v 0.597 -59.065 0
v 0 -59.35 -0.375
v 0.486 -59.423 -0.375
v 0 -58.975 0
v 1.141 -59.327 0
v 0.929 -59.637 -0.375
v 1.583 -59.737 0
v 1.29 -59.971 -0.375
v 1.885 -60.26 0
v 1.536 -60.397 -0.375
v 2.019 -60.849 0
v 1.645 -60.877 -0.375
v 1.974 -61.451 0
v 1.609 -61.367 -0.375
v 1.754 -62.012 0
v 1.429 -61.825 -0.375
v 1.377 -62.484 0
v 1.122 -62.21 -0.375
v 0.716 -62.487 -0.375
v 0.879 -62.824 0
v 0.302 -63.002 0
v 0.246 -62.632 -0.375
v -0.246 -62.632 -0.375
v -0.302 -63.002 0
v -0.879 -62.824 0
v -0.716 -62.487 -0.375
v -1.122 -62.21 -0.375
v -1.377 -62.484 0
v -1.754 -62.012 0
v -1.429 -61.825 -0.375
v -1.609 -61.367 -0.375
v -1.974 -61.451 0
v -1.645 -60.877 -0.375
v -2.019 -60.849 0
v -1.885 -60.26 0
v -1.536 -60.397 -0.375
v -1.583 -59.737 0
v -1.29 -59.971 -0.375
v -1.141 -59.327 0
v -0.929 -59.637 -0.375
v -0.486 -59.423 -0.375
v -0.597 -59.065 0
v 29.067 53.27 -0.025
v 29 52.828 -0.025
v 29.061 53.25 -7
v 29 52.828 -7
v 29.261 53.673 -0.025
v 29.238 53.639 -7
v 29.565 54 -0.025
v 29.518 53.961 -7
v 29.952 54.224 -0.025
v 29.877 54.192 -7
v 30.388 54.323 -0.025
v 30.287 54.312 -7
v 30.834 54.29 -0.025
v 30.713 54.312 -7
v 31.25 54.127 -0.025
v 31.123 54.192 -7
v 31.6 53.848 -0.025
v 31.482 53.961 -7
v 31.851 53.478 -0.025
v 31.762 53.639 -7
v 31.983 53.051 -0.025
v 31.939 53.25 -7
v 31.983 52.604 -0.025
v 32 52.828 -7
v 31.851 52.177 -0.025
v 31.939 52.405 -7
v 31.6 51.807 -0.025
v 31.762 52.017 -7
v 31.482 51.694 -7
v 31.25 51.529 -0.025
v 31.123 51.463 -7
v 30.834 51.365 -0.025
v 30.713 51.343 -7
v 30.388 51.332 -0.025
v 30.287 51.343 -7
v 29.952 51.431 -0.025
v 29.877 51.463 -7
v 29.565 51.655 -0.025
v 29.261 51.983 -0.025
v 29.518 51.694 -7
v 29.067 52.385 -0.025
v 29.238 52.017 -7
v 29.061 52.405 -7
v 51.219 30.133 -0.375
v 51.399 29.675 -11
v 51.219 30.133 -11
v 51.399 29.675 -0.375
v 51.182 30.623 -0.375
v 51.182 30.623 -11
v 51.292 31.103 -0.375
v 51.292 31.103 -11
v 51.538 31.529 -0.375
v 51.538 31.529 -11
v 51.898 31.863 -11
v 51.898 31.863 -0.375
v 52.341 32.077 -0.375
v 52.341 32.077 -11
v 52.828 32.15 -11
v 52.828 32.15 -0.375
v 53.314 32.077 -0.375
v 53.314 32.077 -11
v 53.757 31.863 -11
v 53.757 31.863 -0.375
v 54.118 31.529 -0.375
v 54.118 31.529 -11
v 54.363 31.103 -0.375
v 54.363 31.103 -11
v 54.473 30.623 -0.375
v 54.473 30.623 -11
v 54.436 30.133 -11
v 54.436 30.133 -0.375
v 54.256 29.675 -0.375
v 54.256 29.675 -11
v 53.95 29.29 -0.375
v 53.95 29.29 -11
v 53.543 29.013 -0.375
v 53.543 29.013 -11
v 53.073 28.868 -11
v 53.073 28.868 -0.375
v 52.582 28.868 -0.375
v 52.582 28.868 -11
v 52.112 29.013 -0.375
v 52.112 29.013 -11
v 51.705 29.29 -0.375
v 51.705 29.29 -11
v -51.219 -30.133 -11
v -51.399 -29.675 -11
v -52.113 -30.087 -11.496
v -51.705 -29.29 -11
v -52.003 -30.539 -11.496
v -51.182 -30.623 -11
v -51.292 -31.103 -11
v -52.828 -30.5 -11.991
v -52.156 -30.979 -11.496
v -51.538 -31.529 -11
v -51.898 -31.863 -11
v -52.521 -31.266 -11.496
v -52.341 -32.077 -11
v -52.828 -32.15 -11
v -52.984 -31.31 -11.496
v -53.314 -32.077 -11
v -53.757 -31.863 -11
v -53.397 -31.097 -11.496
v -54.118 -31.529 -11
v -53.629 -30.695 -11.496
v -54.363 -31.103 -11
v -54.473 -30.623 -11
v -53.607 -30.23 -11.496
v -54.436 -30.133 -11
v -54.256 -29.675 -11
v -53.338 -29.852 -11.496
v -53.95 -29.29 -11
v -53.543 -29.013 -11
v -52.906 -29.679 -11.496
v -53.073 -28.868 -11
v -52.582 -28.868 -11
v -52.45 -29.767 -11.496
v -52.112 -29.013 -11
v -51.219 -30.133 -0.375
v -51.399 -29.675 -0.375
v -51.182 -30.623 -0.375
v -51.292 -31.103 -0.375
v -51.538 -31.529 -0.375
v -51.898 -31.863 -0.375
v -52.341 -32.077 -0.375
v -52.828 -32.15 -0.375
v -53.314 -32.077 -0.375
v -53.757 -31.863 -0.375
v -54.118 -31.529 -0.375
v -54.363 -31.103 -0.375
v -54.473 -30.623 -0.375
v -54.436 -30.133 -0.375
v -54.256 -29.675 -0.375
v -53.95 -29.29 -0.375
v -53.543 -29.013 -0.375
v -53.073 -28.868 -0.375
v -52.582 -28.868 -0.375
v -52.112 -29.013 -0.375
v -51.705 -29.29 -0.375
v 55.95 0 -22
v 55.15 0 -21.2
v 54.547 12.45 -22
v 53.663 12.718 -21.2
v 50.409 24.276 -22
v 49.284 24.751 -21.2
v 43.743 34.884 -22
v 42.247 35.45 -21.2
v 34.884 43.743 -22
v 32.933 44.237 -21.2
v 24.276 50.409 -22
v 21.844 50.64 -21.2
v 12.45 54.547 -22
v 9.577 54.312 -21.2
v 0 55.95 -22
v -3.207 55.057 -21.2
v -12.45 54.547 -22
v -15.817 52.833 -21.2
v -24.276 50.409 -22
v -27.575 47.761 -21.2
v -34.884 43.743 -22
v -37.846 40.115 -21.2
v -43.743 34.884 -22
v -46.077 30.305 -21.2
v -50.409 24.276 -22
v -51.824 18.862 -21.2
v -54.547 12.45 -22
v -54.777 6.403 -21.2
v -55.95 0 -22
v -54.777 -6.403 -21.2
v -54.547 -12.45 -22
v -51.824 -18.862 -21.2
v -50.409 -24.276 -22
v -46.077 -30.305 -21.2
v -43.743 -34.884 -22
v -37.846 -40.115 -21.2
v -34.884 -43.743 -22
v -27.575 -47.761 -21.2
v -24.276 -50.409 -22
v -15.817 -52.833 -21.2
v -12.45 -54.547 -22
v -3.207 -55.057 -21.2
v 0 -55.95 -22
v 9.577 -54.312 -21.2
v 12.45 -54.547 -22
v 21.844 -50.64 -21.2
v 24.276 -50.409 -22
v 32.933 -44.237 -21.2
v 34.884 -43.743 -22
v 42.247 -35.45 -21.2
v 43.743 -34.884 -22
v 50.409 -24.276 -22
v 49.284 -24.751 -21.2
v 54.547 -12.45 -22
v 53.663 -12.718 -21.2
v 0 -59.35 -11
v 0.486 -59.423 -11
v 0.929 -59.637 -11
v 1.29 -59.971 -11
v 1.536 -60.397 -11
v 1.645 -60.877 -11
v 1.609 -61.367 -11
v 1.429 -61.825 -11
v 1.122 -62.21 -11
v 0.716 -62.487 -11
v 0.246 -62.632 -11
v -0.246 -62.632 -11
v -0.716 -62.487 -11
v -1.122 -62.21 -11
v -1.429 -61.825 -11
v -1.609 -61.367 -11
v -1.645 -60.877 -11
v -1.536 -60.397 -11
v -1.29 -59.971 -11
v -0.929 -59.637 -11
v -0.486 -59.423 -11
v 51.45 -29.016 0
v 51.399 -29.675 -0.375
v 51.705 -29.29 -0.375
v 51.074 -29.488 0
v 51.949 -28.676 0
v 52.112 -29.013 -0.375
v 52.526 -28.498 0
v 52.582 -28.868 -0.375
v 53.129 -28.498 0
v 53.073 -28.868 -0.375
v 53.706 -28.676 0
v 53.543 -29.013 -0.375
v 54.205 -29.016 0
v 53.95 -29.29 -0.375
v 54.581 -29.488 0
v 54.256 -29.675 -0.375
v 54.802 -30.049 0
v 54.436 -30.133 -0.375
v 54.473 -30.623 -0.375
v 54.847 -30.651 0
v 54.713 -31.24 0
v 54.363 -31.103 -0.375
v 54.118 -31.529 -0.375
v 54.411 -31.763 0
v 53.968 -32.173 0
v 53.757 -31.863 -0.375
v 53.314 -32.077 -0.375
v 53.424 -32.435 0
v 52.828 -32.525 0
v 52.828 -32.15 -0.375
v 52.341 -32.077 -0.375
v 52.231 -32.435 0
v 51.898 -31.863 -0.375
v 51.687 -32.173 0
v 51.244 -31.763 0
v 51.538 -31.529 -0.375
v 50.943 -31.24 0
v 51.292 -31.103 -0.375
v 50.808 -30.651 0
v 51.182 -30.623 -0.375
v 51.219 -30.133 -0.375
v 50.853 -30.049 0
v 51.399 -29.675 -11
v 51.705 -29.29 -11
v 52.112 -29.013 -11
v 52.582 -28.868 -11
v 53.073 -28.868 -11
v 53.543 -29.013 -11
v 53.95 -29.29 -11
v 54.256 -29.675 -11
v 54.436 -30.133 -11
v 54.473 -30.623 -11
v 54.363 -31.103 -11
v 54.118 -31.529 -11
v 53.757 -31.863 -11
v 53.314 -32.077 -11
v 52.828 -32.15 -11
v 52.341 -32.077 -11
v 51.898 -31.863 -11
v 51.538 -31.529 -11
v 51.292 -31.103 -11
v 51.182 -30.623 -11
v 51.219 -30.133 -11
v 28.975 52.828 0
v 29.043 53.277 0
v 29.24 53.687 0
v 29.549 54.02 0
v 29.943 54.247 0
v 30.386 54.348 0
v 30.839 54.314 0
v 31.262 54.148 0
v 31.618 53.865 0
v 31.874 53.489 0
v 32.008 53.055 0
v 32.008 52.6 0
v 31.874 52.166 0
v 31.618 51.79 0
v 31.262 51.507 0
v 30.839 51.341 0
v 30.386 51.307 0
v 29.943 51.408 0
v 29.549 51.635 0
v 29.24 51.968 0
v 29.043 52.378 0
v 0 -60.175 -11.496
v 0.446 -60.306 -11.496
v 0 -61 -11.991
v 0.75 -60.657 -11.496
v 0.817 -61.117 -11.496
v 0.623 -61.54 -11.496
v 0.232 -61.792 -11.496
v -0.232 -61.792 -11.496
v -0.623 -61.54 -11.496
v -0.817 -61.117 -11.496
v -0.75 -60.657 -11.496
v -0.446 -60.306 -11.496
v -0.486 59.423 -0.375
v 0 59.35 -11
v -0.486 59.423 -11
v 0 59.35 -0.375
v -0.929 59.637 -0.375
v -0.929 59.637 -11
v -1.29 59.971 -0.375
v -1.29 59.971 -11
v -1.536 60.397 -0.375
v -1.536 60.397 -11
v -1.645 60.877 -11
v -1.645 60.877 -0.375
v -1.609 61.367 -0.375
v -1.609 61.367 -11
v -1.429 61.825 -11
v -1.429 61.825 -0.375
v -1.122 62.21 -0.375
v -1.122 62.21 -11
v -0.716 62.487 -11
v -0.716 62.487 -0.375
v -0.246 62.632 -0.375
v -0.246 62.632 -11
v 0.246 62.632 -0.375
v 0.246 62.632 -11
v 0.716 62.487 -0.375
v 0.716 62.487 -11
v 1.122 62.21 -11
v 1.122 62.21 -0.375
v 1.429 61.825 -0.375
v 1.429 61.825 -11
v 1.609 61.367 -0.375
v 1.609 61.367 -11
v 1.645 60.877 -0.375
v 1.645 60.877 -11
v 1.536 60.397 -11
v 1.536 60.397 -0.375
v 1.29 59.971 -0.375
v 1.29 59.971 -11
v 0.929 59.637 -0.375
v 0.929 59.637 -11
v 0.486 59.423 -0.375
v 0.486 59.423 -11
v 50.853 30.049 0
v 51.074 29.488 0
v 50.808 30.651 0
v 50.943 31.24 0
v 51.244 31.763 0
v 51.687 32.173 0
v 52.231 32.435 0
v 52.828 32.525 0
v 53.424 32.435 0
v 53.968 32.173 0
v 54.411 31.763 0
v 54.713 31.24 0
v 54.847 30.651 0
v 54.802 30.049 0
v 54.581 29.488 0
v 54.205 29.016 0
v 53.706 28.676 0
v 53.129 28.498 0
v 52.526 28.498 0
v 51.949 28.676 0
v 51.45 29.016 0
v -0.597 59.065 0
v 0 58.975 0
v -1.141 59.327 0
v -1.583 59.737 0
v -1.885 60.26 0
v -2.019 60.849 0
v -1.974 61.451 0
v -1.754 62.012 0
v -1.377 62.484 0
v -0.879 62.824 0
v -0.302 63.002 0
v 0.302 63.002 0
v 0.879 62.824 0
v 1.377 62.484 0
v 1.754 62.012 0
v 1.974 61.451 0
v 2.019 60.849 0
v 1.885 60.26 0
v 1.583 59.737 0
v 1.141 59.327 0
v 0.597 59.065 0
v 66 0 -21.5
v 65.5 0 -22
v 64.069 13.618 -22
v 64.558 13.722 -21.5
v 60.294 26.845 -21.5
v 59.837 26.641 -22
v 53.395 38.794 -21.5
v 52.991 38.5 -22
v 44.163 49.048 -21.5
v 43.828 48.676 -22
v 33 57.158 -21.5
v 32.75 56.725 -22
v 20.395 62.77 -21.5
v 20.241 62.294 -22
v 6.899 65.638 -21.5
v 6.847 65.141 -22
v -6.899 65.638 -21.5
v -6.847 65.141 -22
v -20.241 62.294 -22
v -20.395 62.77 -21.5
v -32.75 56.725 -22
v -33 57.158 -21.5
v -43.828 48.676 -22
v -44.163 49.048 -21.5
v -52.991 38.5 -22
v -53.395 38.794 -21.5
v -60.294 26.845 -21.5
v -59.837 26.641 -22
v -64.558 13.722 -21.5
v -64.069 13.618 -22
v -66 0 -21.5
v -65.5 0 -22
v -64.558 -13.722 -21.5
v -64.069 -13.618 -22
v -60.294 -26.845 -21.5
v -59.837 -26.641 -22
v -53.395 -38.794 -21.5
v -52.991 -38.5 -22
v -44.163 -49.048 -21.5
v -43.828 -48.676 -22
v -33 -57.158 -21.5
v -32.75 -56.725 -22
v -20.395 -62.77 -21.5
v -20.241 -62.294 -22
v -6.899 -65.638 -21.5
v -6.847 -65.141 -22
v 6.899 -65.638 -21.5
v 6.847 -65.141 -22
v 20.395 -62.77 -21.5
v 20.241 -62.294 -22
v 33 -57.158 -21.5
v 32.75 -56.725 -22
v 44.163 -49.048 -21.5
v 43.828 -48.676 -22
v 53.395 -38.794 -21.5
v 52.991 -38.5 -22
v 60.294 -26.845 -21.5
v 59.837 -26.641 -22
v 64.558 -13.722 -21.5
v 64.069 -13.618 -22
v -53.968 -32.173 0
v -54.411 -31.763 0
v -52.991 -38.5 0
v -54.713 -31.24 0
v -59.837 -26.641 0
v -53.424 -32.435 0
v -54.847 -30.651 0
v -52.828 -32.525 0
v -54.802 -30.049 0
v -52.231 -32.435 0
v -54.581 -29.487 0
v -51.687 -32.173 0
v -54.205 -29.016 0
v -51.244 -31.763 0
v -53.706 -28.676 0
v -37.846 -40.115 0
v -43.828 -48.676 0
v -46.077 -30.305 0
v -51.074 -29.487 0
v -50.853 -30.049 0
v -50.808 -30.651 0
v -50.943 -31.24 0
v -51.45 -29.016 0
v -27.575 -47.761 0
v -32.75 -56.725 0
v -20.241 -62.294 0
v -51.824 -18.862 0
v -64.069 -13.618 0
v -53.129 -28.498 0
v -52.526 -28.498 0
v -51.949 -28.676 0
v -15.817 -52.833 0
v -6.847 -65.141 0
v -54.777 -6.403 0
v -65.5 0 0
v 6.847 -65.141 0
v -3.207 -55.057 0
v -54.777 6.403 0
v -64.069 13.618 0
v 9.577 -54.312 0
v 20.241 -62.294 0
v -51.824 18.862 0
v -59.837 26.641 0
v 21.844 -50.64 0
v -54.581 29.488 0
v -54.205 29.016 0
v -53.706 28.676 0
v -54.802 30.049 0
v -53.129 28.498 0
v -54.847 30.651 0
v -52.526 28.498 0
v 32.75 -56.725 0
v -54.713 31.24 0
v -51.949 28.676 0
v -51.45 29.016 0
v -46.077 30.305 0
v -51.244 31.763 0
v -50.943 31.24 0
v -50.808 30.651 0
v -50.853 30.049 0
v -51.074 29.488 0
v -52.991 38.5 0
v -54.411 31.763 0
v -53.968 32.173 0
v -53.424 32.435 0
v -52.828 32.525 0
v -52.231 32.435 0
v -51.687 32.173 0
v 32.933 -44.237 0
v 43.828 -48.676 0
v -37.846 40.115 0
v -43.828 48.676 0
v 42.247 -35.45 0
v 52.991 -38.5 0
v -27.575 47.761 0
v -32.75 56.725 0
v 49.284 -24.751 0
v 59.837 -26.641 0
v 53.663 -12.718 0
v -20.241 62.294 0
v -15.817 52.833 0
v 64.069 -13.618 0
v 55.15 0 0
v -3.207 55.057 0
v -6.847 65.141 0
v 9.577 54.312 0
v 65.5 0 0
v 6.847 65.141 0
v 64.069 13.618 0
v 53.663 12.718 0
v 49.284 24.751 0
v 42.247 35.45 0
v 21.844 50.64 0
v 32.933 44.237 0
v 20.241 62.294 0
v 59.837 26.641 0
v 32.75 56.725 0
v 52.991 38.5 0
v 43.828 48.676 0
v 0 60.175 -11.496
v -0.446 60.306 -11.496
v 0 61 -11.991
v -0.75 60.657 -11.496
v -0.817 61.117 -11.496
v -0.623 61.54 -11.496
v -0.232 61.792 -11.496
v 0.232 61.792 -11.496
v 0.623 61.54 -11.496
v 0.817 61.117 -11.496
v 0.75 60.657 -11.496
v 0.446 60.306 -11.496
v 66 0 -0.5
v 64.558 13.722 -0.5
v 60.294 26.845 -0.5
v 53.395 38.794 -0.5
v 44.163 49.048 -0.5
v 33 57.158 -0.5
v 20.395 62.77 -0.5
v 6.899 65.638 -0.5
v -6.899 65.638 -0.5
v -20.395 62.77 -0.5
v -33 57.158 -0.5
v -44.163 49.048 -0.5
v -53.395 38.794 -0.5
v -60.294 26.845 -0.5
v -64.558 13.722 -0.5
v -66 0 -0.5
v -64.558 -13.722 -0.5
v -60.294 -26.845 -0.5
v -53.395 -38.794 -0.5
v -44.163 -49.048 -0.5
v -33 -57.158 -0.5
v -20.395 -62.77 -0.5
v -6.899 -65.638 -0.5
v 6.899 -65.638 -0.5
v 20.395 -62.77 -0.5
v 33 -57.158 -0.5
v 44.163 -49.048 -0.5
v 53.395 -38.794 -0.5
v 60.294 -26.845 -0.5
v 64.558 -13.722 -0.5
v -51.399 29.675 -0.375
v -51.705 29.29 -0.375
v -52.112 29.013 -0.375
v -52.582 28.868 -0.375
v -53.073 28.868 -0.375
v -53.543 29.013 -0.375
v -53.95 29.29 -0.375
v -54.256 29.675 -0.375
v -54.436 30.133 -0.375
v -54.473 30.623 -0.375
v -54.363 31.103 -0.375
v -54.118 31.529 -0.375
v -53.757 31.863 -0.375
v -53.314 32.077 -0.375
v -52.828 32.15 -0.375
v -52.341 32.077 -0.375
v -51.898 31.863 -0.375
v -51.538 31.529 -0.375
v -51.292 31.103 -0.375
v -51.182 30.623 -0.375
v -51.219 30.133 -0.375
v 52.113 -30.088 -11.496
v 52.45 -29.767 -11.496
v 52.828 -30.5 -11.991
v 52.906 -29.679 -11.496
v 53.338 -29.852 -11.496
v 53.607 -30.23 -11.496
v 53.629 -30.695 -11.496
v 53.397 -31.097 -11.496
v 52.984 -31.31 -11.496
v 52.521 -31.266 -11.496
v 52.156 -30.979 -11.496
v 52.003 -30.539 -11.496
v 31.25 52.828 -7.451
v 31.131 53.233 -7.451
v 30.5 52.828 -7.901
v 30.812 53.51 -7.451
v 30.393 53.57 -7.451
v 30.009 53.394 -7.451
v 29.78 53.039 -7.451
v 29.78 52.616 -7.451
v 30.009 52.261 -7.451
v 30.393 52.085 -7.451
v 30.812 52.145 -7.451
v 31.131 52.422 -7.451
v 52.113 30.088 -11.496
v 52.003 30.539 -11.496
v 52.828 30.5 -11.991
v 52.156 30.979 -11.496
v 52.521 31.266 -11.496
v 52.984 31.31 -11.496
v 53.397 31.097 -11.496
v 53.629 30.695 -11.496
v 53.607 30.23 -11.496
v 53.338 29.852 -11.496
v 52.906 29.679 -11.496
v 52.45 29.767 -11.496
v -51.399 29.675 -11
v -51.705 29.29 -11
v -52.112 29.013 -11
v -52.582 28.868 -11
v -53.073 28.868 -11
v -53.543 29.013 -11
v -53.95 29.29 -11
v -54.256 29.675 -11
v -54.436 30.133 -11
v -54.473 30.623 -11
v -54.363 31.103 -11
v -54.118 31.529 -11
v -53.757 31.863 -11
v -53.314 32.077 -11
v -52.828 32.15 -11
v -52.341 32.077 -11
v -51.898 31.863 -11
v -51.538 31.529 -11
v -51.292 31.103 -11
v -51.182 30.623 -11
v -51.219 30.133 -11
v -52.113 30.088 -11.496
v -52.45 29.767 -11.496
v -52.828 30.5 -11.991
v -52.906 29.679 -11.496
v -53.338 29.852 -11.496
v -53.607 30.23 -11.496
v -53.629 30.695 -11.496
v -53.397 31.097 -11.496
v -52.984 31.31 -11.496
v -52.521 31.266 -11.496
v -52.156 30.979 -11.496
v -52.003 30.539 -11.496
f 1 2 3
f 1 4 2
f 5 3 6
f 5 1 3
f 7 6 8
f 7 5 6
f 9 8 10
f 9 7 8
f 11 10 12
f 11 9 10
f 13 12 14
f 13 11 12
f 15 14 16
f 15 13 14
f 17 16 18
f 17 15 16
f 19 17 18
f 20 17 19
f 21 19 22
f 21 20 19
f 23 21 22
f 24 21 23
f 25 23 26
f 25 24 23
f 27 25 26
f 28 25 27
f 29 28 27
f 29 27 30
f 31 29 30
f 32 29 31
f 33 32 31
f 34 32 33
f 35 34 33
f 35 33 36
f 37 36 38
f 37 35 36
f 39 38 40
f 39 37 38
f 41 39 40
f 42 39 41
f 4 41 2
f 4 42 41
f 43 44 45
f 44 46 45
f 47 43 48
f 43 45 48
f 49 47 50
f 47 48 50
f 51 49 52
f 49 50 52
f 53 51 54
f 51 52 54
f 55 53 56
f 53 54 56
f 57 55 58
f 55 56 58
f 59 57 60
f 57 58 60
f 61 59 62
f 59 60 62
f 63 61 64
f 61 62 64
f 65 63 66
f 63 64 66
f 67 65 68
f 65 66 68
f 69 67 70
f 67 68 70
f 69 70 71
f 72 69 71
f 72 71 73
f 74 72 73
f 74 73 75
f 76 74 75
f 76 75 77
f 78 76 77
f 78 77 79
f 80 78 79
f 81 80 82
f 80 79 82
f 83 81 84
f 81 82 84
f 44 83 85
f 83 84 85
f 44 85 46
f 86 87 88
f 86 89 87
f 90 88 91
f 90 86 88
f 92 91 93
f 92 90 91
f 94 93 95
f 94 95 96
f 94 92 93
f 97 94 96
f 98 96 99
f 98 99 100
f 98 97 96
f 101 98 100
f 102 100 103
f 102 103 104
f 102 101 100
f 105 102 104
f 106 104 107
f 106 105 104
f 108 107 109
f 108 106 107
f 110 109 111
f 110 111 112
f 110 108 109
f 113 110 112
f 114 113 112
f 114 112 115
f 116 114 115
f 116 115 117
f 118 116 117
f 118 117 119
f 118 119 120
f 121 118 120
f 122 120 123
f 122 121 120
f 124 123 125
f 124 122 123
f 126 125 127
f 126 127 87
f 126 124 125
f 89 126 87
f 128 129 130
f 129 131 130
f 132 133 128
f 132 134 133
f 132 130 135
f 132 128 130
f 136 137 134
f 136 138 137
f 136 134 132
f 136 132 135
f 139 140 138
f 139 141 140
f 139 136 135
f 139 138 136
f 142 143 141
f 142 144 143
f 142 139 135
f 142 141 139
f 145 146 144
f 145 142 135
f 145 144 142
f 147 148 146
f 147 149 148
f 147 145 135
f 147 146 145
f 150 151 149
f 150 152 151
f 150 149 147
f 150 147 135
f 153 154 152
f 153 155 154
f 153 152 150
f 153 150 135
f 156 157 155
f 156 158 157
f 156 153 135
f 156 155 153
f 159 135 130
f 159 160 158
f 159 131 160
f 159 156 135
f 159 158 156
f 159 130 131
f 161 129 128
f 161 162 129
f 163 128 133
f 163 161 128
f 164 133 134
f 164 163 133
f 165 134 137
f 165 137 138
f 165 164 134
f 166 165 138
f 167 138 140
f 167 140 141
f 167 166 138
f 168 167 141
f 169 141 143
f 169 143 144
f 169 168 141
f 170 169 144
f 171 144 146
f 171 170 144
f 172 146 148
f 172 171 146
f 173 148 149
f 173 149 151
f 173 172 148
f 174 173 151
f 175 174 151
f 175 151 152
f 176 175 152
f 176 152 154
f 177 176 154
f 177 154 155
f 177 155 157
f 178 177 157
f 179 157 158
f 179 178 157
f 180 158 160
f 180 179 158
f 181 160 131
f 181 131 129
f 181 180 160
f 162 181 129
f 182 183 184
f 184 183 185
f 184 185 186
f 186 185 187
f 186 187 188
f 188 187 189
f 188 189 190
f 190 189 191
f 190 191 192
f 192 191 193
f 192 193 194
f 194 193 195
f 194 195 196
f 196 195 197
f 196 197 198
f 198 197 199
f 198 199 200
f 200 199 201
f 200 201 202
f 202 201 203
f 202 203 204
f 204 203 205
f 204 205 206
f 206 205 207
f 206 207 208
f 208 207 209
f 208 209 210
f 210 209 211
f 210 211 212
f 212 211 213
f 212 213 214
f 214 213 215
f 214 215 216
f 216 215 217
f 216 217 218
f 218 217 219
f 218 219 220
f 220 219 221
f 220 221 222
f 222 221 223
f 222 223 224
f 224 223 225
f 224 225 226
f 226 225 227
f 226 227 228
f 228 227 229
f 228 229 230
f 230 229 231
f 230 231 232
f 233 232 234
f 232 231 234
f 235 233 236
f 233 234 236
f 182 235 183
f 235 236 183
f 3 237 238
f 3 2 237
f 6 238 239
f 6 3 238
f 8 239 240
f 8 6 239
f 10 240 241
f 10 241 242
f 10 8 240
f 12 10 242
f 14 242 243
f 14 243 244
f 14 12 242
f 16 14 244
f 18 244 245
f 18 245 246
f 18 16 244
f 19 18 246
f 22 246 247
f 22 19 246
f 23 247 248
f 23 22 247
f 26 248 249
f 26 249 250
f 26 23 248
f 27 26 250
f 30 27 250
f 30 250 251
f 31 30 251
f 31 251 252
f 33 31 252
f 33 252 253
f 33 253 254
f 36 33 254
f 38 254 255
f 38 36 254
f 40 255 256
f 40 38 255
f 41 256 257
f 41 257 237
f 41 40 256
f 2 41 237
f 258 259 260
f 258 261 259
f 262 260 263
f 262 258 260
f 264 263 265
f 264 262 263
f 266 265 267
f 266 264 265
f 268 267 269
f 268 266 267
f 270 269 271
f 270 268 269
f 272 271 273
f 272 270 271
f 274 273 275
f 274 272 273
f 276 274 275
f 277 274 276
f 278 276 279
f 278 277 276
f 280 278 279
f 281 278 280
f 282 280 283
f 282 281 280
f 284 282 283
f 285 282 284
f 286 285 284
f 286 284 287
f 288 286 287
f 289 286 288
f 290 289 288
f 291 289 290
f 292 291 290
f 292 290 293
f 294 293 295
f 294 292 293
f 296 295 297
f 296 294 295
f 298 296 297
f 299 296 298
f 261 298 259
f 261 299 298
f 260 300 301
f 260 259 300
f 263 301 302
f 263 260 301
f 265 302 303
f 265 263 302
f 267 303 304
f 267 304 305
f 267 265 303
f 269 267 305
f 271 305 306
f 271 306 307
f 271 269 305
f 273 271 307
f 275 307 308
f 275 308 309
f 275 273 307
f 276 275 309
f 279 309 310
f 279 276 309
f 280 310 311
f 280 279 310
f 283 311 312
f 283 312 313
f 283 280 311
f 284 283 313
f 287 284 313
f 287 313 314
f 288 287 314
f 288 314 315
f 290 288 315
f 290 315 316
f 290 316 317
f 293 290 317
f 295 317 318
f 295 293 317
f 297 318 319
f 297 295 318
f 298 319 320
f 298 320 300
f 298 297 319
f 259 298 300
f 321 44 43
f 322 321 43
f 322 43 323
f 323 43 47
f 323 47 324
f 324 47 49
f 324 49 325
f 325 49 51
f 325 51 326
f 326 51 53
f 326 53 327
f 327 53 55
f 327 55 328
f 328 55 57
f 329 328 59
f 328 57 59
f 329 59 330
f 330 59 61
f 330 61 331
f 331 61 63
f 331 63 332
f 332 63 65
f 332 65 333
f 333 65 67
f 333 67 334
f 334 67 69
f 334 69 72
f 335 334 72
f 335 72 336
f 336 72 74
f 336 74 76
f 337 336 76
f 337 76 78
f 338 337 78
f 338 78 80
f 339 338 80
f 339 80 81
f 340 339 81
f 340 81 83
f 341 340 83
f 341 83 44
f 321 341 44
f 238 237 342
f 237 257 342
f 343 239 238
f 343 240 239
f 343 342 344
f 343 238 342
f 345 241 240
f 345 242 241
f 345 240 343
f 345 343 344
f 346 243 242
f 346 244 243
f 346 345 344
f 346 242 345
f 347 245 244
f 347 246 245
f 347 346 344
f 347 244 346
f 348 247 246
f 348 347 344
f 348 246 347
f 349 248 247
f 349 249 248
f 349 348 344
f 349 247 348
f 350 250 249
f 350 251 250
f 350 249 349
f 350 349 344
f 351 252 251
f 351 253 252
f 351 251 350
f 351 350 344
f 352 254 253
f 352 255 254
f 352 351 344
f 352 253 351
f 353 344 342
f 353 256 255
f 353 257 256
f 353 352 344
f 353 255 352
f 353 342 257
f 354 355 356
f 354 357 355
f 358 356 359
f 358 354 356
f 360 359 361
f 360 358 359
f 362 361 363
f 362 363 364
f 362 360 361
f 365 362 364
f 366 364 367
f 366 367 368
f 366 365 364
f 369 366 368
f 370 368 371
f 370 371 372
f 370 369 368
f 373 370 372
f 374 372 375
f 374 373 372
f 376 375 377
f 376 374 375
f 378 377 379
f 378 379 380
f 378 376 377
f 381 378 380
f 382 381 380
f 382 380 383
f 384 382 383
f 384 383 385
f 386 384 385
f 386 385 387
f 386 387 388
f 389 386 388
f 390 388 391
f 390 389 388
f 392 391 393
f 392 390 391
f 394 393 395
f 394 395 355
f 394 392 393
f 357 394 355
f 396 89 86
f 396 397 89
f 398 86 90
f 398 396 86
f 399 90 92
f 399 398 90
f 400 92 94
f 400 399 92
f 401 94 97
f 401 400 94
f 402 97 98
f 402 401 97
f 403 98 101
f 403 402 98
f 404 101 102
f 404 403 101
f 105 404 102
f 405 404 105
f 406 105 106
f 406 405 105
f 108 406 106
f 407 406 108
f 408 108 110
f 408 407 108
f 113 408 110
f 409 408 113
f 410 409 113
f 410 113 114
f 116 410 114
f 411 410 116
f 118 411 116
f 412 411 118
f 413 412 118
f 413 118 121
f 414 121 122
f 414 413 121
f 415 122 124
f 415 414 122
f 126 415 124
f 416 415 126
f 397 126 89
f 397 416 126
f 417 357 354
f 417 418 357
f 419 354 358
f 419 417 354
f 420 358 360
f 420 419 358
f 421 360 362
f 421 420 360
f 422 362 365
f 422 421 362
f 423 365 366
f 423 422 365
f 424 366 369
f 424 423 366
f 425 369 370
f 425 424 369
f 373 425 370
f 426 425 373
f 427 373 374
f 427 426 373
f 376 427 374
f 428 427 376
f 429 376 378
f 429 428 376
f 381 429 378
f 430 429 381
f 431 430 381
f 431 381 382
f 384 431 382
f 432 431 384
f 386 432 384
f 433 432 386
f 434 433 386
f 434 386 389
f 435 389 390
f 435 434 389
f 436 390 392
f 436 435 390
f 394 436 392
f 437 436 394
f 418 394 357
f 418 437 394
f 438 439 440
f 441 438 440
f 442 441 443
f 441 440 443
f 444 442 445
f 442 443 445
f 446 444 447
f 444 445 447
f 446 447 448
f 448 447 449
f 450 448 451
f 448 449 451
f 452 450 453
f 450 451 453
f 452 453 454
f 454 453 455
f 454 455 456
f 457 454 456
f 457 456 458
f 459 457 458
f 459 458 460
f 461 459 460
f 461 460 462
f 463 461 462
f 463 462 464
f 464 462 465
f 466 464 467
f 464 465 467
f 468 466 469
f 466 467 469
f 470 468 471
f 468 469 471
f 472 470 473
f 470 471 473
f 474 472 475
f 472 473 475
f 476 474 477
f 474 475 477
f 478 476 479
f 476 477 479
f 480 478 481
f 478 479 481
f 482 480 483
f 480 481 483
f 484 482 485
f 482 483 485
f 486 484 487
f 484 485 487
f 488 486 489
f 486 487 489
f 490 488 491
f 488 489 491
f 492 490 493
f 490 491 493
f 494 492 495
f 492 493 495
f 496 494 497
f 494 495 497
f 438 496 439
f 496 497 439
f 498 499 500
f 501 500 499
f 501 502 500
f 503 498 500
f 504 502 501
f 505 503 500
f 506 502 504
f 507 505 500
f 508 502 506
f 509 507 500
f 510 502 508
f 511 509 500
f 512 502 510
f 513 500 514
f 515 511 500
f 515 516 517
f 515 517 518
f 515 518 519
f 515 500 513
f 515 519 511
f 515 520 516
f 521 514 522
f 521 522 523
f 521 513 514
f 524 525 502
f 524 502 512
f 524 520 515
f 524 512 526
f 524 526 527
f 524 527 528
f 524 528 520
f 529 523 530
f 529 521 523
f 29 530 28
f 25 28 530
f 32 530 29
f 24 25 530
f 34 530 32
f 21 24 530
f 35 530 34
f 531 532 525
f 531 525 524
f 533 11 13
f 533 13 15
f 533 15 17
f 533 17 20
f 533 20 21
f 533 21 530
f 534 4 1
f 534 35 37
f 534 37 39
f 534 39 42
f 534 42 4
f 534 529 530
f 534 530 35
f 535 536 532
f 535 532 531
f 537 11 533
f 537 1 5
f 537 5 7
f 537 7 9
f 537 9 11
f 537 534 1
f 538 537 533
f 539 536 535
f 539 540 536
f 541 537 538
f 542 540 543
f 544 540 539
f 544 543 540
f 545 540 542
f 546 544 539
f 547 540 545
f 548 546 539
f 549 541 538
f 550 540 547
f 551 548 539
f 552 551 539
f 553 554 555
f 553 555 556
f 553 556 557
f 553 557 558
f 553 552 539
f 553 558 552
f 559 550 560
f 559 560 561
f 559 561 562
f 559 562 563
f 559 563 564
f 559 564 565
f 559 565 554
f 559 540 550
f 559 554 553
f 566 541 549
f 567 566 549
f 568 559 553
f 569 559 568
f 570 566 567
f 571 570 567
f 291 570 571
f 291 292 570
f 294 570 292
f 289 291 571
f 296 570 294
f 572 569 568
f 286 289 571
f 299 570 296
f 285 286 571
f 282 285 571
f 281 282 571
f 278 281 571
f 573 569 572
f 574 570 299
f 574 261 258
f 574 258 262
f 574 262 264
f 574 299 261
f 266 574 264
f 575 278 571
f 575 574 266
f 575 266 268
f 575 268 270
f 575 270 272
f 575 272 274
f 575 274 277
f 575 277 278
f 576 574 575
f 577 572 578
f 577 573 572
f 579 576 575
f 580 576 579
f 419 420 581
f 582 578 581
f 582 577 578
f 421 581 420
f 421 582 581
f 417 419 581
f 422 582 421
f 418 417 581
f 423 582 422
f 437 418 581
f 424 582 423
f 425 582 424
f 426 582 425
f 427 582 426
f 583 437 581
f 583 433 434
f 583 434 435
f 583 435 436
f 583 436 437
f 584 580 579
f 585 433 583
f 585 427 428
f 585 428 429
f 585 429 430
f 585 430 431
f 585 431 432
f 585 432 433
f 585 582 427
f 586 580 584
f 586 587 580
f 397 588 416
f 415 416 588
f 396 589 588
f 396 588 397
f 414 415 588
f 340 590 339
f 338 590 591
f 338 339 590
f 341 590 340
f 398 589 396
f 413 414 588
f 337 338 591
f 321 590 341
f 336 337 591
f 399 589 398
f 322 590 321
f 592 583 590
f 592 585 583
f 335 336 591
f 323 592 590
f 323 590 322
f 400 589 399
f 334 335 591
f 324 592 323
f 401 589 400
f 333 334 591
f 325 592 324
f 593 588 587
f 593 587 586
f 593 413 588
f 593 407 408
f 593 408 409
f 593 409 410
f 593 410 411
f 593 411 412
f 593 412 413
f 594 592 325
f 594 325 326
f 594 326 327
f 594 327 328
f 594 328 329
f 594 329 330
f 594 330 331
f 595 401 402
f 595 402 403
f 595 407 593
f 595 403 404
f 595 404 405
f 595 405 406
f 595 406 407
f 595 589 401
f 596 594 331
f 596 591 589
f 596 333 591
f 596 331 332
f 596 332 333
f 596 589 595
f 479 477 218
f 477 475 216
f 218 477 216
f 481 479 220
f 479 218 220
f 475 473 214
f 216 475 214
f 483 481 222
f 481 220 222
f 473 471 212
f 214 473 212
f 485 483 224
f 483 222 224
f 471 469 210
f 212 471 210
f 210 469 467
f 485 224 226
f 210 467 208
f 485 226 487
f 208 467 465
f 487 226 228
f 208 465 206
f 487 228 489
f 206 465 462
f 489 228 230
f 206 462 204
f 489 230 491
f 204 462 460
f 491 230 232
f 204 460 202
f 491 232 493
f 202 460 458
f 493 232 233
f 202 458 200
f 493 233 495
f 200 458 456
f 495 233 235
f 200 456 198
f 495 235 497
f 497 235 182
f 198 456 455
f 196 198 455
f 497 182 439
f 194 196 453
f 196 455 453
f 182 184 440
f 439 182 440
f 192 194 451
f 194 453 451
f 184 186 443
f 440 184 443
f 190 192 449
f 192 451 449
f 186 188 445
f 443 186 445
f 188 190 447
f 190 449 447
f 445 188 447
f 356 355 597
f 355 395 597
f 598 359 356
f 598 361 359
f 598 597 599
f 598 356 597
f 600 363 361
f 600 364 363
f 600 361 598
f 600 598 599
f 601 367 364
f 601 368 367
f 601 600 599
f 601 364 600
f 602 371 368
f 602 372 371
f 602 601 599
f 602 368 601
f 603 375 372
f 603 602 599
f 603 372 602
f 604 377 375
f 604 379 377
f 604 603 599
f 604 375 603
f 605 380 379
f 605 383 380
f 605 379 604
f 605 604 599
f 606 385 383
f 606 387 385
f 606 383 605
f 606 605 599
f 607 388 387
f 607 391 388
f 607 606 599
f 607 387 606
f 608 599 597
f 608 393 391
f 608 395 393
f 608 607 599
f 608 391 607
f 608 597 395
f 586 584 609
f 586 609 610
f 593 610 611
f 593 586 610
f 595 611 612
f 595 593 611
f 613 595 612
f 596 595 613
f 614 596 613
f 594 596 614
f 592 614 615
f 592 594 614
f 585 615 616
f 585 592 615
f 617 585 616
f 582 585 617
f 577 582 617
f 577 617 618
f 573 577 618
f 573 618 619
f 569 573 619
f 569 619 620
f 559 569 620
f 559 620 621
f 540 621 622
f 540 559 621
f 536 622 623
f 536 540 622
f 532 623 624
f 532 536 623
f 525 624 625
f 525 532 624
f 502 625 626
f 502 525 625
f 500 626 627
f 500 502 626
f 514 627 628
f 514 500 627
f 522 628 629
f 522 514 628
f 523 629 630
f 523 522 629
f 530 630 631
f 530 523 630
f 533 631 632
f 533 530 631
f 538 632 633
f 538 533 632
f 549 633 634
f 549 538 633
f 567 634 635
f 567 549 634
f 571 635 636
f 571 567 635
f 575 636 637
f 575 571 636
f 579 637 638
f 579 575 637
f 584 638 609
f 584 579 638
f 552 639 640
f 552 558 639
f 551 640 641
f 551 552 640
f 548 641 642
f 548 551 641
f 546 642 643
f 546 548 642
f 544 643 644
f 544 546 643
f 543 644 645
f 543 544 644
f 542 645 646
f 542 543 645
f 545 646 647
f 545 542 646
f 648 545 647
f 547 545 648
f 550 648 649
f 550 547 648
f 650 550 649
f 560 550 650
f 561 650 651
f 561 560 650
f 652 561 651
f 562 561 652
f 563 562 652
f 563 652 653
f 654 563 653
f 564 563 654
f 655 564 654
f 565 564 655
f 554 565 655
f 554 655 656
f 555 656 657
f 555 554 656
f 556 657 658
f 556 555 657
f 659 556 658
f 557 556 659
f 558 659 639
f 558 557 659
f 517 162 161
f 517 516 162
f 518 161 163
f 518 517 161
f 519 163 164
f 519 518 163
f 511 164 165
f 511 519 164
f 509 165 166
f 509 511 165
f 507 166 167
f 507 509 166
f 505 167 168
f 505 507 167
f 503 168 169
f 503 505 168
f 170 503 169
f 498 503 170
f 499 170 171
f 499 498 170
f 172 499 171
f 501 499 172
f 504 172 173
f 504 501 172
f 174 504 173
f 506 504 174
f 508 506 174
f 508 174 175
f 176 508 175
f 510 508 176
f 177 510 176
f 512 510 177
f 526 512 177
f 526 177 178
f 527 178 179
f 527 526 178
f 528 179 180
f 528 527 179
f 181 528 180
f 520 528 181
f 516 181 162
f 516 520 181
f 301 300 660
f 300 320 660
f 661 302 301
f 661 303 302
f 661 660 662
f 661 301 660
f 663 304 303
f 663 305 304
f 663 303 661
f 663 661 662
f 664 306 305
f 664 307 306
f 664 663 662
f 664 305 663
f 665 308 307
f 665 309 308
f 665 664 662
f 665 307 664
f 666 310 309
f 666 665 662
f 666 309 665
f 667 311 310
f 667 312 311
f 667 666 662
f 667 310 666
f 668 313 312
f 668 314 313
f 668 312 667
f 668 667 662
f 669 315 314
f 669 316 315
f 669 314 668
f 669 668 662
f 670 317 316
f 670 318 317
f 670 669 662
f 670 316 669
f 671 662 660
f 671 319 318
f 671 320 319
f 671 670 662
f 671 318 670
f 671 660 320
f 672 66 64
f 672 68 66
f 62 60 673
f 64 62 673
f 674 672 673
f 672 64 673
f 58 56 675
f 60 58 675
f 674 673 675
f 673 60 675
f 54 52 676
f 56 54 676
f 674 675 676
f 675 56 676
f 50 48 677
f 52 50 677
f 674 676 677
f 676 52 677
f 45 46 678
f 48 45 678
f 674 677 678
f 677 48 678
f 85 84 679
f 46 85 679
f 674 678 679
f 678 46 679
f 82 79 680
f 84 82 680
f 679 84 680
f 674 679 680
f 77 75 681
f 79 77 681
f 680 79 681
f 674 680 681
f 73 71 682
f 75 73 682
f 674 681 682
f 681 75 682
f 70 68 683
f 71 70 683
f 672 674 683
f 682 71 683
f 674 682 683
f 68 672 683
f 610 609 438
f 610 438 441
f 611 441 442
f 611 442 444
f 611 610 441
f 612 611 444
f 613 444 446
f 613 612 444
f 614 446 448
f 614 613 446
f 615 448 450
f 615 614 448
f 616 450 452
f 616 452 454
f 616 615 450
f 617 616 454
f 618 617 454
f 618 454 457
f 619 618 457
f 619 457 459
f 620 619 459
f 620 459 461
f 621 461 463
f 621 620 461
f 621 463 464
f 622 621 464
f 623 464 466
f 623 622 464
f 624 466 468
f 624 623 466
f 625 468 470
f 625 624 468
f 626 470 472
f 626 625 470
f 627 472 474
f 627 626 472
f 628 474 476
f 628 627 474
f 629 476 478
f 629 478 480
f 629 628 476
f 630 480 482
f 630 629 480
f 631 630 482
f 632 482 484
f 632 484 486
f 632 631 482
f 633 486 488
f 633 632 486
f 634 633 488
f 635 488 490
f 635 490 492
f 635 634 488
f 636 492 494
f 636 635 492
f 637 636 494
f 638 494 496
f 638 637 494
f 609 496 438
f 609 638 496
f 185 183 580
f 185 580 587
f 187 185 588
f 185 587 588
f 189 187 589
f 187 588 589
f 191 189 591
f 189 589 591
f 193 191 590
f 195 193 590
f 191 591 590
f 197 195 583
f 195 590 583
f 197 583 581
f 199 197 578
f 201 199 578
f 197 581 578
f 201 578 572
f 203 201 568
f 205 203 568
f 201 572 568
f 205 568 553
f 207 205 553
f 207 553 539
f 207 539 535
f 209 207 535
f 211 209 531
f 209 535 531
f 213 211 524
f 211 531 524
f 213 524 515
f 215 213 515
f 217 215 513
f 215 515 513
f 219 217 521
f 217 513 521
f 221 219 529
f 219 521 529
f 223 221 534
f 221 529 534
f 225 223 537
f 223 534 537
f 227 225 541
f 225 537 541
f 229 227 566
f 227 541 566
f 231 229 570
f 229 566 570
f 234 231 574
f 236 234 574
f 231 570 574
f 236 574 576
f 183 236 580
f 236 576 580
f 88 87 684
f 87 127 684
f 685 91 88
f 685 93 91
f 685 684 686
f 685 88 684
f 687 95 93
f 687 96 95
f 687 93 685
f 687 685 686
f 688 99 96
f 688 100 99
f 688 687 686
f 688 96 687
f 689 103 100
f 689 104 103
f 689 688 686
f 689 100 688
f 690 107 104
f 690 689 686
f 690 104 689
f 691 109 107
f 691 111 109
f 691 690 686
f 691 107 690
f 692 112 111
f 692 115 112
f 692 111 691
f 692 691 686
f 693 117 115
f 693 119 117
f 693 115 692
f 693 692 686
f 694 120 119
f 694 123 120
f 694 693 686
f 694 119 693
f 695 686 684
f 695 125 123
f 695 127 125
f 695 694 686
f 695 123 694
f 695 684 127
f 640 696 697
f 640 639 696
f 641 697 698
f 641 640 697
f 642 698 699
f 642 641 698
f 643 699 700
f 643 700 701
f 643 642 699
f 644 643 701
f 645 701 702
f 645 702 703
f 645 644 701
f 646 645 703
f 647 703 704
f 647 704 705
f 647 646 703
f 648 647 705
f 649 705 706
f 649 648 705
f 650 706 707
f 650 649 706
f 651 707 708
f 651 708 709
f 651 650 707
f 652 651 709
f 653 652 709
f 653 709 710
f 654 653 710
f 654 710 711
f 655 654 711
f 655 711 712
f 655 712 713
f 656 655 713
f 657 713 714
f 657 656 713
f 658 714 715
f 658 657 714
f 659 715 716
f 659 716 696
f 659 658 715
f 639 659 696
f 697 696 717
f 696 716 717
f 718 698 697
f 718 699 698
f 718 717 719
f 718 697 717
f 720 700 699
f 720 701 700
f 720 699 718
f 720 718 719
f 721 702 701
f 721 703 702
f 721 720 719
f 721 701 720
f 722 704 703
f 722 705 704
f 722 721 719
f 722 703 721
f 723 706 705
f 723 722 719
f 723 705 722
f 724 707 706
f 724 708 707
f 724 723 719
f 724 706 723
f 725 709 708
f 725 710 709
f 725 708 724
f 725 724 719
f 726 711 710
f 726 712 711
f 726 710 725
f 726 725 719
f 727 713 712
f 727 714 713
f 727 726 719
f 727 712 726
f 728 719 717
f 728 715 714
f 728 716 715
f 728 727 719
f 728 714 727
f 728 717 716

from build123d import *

# Parameters (mm, degrees)
SKETCH1_R                       = 66
SKETCH1_R_2                     = 55.15
COLLAR_BODY_DEPTH               = 22
M4PATTERN_COUNT                 = 6
F_3_0MM_DOWEL_HOLE5_D           = 3
F_3_0MM_DOWEL_HOLE5_DEPTH       = 7
F_3_0MM_DOWEL_HOLE5_CSINK_D     = 3.05
F_3_0MM_DOWEL_HOLE5_CSINK_ANGLE = 90
F_3_0MM_DOWEL_HOLE5_TIP         = 0.901290929
CHAMFER1_SIZE                   = 0.5
CHAMFER2_SIZE                   = 0.8


with BuildPart() as part:
    # Sketch1 → Collar_Body (new body)
    with BuildSketch(Plane.XY):
        Circle(SKETCH1_R)
        Circle(SKETCH1_R_2, mode=Mode.SUBTRACT)
    extrude(amount=-COLLAR_BODY_DEPTH)

    # Sketch5 → M4x0.7 Bottoming Tapped Hole1 (revolve, cut)
    with BuildSketch(Plane(origin=(0, 61, 0), x_dir=(0, -1, 0), z_dir=(1, 0, 0))):
        Polygon((0, 0), (0, 11.991420021), (1.65, 11), (1.65, 0.375), (2.025, 0), align=None)
    m4x0_7_bottoming_tapped_hole1 = revolve(axis=Axis((0, 61, 6.35), (0, 0, -1)), mode=Mode.SUBTRACT)

    # M4pattern: M4x0.7 Bottoming Tapped Hole1 ×6 about axis
    m4pattern_axis = Axis((0, 0, 0), (0, 0, 1))
    for i in range(1, M4PATTERN_COUNT):
        add(m4x0_7_bottoming_tapped_hole1.rotate(m4pattern_axis, i * 360 / M4PATTERN_COUNT), mode=Mode.SUBTRACT)

    # Ø3.0mm Dowel Hole5
    with Locations(Plane.XY):
        with Locations((30.5, 52.827549631)):
            CounterSinkHole(F_3_0MM_DOWEL_HOLE5_D / 2, F_3_0MM_DOWEL_HOLE5_CSINK_D / 2, depth=F_3_0MM_DOWEL_HOLE5_DEPTH, counter_sink_angle=F_3_0MM_DOWEL_HOLE5_CSINK_ANGLE)
            with Locations((0, 0, -(F_3_0MM_DOWEL_HOLE5_DEPTH + F_3_0MM_DOWEL_HOLE5_TIP / 2))):  # 118° drill point
                Cone(0, F_3_0MM_DOWEL_HOLE5_D / 2, F_3_0MM_DOWEL_HOLE5_TIP, mode=Mode.SUBTRACT)

    # Chamfer1
    chamfer1_edges = [part.edges().sort_by_distance(p)[0] for p in [
        (-66, 0, 0),
        (-66, 0, -22),
    ]]
    chamfer(chamfer1_edges, length=CHAMFER1_SIZE)

    # Chamfer2
    chamfer2_edges = [part.edges().sort_by_distance(p)[0] for p in [
        (-55.15, 0, -22),
    ]]
    chamfer(chamfer2_edges, length=CHAMFER2_SIZE)


solid = part.part
